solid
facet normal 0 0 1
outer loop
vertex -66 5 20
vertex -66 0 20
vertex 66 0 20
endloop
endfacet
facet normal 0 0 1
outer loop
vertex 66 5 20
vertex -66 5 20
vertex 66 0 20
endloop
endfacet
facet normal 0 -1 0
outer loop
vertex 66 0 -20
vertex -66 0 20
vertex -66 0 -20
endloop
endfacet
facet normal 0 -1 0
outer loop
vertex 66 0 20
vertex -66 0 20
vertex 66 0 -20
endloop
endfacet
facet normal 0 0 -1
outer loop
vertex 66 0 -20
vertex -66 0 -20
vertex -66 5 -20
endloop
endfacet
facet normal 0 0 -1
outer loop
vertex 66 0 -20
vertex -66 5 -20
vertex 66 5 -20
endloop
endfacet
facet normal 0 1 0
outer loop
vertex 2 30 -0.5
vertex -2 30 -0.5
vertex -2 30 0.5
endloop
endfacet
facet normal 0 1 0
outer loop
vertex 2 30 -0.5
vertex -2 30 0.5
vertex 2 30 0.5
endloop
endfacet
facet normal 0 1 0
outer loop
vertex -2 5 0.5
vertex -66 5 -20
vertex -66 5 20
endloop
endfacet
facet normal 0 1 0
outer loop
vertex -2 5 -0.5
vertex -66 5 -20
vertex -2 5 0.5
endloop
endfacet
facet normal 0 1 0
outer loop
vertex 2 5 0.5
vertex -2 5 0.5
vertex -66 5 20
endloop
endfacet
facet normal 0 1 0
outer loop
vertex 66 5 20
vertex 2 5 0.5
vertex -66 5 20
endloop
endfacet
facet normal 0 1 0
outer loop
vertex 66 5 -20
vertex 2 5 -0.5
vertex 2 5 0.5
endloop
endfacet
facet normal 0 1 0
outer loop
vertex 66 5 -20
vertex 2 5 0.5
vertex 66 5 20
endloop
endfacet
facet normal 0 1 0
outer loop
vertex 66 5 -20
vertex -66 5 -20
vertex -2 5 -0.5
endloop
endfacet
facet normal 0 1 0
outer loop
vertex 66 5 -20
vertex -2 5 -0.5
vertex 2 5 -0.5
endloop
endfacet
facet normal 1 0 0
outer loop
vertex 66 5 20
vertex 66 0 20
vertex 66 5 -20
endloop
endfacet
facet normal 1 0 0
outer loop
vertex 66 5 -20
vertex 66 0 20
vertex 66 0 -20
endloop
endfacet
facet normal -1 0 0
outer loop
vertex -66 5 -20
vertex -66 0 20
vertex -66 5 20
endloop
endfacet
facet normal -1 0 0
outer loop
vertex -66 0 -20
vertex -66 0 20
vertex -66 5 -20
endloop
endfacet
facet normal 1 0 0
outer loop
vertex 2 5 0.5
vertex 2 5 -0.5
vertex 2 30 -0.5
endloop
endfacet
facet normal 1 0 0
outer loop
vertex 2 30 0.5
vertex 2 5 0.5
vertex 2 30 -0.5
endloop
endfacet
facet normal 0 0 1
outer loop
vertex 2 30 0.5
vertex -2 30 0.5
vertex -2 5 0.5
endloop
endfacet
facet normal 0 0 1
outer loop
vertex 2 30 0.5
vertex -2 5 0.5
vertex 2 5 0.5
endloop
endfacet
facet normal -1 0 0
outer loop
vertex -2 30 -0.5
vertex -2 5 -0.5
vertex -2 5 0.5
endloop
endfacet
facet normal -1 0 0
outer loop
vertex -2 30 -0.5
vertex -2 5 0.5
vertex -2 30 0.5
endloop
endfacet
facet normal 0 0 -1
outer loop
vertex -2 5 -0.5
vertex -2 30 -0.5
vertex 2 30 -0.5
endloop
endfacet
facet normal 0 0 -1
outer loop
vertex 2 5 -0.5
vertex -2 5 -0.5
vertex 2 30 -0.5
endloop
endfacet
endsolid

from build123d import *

# Parameters (mm, degrees)
SKETCH1_W                = 132
SKETCH1_H                = 40
BOSS_EXTRUDE1_DEPTH      = 5
SKETCH2_W                = 4
SKETCH2_H                = 30
BOSS_EXTRUDE2_DEPTH      = 0.5
BOSS_EXTRUDE2_DEPTH_BACK = 0.5


with BuildPart() as part:
    # Sketch1 → Boss-Extrude1 (new body)
    with BuildSketch(Plane(origin=(0, 0, 0), x_dir=(1, 0, 0), z_dir=(0, 1, 0))):
        Rectangle(SKETCH1_W, SKETCH1_H)
    extrude(amount=BOSS_EXTRUDE1_DEPTH)

    # Sketch2 → Boss-Extrude2 (add, two sides)
    with BuildSketch(Plane.XY) as boss_extrude2_sk:
        with Locations((0, 15)):
            Rectangle(SKETCH2_W, SKETCH2_H)
    extrude(amount=BOSS_EXTRUDE2_DEPTH)
    extrude(boss_extrude2_sk.sketch, amount=-BOSS_EXTRUDE2_DEPTH_BACK)


solid = part.part
